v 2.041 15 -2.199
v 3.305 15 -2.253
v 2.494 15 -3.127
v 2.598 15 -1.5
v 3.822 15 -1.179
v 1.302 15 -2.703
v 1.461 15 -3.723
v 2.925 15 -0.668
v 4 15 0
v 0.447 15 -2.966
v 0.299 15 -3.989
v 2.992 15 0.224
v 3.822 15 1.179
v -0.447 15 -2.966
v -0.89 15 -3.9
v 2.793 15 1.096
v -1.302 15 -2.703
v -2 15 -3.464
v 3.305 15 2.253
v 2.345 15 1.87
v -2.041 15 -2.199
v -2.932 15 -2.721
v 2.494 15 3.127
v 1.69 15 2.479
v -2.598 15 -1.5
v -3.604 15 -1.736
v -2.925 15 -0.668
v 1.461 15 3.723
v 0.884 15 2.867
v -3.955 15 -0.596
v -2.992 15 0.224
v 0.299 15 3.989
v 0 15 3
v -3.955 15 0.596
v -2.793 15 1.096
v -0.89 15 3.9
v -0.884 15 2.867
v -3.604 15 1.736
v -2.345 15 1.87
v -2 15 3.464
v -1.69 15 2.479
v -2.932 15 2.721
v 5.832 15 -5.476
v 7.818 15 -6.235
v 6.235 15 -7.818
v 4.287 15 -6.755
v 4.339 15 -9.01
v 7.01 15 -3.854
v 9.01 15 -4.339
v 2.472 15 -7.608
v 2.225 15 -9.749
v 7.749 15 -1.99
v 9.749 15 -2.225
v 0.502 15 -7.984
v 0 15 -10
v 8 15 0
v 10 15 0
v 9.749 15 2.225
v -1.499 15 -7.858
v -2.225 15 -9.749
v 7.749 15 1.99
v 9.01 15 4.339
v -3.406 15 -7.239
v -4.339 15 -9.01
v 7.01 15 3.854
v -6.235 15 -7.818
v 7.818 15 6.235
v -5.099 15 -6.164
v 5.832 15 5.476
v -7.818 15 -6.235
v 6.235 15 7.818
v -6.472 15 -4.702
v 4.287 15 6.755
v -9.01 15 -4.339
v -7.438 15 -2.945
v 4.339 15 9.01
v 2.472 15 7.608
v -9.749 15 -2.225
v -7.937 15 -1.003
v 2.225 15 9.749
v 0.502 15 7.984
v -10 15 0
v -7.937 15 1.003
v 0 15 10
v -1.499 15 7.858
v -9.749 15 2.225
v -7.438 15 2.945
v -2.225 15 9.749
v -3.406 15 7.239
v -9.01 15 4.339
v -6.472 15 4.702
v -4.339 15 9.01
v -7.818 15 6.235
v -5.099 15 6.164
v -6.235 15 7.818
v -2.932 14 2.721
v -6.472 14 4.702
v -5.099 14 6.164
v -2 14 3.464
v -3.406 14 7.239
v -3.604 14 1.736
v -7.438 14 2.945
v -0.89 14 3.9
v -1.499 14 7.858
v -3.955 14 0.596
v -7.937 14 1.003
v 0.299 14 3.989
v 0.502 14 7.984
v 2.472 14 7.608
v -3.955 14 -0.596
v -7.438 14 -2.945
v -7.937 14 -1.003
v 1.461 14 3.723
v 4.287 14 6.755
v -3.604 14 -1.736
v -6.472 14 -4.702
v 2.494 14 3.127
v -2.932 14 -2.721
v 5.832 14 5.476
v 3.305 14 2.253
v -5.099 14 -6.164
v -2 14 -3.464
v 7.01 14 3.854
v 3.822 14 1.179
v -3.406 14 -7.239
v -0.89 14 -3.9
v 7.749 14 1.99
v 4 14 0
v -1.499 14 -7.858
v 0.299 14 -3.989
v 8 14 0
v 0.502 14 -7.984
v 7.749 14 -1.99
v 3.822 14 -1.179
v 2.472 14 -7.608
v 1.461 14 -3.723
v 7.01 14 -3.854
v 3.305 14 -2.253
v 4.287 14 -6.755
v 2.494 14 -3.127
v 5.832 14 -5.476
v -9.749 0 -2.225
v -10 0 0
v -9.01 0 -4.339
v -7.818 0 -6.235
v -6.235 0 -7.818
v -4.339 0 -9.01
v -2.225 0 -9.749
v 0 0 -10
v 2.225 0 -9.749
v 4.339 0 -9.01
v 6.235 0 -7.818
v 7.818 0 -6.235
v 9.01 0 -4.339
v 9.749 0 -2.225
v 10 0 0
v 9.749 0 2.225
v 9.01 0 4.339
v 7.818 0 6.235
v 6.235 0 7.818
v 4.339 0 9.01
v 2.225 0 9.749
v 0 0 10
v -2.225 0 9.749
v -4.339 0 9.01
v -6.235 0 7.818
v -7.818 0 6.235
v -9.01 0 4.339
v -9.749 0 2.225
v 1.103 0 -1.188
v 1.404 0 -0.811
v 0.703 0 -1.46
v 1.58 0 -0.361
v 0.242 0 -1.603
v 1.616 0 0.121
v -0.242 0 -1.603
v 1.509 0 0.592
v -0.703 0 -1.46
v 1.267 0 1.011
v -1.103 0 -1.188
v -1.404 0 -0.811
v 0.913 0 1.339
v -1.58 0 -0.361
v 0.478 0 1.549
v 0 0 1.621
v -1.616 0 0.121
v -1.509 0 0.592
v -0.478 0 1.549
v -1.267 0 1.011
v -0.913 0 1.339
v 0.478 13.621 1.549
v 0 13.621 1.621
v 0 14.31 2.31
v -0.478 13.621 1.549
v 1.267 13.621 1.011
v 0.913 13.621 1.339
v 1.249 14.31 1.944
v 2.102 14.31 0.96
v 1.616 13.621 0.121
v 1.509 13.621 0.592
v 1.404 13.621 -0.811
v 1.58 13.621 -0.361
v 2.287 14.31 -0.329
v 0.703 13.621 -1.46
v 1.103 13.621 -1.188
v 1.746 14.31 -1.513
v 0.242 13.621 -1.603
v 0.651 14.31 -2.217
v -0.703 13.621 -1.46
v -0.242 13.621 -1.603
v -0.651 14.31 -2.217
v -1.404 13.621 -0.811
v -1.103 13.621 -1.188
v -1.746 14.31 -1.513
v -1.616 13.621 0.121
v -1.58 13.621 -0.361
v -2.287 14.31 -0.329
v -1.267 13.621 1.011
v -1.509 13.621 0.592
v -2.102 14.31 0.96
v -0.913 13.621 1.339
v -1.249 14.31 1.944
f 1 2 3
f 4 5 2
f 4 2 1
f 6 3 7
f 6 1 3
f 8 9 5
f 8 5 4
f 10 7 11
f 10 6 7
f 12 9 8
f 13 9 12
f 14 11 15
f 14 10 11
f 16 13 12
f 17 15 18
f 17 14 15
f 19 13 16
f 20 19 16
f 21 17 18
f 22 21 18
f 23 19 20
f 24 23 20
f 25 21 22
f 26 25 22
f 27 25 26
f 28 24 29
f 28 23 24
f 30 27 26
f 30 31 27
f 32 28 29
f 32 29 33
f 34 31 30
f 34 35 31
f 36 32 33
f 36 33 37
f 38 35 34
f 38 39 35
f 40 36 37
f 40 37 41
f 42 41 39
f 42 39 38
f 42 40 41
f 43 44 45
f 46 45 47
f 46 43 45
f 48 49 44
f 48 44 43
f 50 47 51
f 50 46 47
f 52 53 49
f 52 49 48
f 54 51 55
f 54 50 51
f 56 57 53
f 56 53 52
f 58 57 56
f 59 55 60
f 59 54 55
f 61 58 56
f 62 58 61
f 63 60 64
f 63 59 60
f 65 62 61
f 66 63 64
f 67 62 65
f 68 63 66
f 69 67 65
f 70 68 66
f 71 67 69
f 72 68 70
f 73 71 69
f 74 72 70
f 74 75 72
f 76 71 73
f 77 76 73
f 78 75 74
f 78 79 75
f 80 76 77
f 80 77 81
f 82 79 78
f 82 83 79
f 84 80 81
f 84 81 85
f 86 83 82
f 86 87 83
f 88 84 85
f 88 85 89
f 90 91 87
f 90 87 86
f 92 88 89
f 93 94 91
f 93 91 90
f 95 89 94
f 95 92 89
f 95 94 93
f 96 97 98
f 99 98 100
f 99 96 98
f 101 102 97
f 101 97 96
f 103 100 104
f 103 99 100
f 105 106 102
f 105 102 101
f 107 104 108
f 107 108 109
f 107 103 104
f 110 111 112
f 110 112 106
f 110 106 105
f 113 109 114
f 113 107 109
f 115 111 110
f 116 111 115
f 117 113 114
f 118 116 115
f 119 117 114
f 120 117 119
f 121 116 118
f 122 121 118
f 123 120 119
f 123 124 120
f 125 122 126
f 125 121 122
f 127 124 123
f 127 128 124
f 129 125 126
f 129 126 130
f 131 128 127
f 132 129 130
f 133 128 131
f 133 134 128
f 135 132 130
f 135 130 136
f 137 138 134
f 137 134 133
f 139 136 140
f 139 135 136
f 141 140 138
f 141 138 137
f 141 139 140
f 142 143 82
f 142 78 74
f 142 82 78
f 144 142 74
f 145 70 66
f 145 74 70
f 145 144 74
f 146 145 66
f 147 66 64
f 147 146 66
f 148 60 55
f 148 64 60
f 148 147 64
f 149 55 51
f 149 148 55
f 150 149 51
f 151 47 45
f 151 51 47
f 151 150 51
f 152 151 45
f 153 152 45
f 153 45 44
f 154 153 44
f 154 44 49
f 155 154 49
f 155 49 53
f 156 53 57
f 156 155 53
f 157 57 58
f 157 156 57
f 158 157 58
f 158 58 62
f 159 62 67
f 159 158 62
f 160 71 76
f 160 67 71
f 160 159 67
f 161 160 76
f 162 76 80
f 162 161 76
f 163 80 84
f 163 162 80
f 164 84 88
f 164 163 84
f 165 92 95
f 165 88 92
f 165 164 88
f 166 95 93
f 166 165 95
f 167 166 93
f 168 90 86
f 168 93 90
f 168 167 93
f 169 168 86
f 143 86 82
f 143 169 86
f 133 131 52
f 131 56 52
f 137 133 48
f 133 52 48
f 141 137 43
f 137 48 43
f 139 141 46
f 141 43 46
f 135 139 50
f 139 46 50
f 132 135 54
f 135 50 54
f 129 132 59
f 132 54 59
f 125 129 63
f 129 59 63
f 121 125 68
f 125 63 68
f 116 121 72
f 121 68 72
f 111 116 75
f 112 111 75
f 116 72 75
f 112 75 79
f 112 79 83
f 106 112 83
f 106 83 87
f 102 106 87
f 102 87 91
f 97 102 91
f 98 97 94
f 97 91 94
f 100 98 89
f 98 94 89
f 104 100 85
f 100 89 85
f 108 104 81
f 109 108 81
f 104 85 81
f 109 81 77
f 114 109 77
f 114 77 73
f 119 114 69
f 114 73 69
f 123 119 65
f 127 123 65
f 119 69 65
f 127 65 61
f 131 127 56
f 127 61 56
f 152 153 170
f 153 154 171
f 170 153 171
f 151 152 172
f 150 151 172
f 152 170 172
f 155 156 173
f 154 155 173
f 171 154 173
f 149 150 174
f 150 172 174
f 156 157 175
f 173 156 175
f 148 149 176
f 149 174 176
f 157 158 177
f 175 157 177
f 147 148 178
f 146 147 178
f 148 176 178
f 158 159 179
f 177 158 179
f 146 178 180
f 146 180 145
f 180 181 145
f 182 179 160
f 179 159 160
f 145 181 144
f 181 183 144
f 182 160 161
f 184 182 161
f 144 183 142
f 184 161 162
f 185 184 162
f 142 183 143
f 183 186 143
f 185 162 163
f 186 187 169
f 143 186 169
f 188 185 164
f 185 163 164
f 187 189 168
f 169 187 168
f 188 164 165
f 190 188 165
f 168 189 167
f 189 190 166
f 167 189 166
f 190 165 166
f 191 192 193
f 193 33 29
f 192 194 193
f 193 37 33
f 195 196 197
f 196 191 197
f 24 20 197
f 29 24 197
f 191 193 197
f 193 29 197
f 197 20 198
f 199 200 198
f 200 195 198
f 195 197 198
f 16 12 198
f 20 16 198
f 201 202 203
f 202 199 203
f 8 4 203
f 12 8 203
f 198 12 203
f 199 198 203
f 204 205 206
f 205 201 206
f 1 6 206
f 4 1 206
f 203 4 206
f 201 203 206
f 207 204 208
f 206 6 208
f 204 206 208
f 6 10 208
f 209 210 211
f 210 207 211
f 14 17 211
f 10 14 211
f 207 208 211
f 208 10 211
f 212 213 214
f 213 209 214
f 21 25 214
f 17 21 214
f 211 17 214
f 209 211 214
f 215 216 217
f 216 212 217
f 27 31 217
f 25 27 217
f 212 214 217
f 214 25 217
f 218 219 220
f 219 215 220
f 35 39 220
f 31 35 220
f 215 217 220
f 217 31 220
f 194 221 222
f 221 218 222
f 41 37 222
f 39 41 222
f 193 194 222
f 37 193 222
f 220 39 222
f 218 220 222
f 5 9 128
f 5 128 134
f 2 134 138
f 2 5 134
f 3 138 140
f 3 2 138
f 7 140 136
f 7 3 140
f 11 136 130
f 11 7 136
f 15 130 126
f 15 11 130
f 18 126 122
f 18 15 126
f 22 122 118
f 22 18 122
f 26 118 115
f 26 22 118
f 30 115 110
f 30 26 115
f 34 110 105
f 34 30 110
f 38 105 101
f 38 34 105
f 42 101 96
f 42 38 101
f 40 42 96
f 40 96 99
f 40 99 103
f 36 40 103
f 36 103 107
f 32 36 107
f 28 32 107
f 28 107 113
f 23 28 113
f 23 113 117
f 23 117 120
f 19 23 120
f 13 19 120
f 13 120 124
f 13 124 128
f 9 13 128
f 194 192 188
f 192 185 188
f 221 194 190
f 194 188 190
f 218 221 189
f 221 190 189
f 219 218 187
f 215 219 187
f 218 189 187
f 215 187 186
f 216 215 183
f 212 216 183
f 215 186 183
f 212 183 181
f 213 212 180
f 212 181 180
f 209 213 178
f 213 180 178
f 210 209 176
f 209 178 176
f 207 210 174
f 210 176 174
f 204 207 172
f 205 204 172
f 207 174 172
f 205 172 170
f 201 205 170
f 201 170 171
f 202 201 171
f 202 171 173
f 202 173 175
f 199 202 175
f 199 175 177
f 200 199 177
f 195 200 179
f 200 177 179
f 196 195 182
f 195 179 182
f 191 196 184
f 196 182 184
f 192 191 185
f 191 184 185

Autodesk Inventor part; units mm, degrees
ref_plane "YZ Plane" through (0, 0, 0) normal (1, 0, 0) x (0, 1, 0)
ref_plane "XZ Plane" through (0, 0, 0) normal (0, 1, 0) x (-1, 0, 0)
ref_plane "XY Plane" through (0, 0, 0) normal (0, 0, 1) x (1, 0, 0)
sketch "Sketch1" plane through (0, 0, 0) normal (0, 1, 0) x (-1, 0, 0)
  circle A0 centre (0, 0) radius 10
  dimension "d0" = 20
extrude "Extrusion1" add sketch "Sketch1" along normal blind 15
sketch "Sketch2" plane through (0, 15, 0) normal (0, 1, 0) x (1, 0, 0)
  circle A0 centre (0, 0) radius 4
  circle A1 centre (0, 0) radius 8
  circle A2 centre (0, 0) radius 10 projected
  dimension "d3" = 8
  dimension "d4" = 2
extrude "Extrusion2" cut sketch "Sketch2" against normal blind 9 contours A1
sketch "Sketch3" plane through (0, 6, 0) normal (0, 1, 0) x (1, 0, 0)
  circle A0 centre (0, 0) radius 4
  circle A1 centre (0, 0) radius 4 projected
  circle A2 centre (0, 0) radius 8
  circle A3 centre (0, 0) radius 8 projected
extrude "Extrusion3" add sketch "Sketch3" along normal blind 8
sketch "Sketch5" plane through (0, 15, 0) normal (0, 1, 0) x (1, 0, 0)
  circle A0 centre (0, 0) radius 4 projected
  circle A1 centre (0, 0) radius 2
  dimension "d20" = 4
hole "Hole2" at (0, 15, 0) direction (0, -1, 0) diameter 3.242 end through all countersink diameter 6 countersink angle 90 thread size "M4x0.7" class "6H" standard "ISO Metric profile"
properties part number "20-15 Electromagnet"
